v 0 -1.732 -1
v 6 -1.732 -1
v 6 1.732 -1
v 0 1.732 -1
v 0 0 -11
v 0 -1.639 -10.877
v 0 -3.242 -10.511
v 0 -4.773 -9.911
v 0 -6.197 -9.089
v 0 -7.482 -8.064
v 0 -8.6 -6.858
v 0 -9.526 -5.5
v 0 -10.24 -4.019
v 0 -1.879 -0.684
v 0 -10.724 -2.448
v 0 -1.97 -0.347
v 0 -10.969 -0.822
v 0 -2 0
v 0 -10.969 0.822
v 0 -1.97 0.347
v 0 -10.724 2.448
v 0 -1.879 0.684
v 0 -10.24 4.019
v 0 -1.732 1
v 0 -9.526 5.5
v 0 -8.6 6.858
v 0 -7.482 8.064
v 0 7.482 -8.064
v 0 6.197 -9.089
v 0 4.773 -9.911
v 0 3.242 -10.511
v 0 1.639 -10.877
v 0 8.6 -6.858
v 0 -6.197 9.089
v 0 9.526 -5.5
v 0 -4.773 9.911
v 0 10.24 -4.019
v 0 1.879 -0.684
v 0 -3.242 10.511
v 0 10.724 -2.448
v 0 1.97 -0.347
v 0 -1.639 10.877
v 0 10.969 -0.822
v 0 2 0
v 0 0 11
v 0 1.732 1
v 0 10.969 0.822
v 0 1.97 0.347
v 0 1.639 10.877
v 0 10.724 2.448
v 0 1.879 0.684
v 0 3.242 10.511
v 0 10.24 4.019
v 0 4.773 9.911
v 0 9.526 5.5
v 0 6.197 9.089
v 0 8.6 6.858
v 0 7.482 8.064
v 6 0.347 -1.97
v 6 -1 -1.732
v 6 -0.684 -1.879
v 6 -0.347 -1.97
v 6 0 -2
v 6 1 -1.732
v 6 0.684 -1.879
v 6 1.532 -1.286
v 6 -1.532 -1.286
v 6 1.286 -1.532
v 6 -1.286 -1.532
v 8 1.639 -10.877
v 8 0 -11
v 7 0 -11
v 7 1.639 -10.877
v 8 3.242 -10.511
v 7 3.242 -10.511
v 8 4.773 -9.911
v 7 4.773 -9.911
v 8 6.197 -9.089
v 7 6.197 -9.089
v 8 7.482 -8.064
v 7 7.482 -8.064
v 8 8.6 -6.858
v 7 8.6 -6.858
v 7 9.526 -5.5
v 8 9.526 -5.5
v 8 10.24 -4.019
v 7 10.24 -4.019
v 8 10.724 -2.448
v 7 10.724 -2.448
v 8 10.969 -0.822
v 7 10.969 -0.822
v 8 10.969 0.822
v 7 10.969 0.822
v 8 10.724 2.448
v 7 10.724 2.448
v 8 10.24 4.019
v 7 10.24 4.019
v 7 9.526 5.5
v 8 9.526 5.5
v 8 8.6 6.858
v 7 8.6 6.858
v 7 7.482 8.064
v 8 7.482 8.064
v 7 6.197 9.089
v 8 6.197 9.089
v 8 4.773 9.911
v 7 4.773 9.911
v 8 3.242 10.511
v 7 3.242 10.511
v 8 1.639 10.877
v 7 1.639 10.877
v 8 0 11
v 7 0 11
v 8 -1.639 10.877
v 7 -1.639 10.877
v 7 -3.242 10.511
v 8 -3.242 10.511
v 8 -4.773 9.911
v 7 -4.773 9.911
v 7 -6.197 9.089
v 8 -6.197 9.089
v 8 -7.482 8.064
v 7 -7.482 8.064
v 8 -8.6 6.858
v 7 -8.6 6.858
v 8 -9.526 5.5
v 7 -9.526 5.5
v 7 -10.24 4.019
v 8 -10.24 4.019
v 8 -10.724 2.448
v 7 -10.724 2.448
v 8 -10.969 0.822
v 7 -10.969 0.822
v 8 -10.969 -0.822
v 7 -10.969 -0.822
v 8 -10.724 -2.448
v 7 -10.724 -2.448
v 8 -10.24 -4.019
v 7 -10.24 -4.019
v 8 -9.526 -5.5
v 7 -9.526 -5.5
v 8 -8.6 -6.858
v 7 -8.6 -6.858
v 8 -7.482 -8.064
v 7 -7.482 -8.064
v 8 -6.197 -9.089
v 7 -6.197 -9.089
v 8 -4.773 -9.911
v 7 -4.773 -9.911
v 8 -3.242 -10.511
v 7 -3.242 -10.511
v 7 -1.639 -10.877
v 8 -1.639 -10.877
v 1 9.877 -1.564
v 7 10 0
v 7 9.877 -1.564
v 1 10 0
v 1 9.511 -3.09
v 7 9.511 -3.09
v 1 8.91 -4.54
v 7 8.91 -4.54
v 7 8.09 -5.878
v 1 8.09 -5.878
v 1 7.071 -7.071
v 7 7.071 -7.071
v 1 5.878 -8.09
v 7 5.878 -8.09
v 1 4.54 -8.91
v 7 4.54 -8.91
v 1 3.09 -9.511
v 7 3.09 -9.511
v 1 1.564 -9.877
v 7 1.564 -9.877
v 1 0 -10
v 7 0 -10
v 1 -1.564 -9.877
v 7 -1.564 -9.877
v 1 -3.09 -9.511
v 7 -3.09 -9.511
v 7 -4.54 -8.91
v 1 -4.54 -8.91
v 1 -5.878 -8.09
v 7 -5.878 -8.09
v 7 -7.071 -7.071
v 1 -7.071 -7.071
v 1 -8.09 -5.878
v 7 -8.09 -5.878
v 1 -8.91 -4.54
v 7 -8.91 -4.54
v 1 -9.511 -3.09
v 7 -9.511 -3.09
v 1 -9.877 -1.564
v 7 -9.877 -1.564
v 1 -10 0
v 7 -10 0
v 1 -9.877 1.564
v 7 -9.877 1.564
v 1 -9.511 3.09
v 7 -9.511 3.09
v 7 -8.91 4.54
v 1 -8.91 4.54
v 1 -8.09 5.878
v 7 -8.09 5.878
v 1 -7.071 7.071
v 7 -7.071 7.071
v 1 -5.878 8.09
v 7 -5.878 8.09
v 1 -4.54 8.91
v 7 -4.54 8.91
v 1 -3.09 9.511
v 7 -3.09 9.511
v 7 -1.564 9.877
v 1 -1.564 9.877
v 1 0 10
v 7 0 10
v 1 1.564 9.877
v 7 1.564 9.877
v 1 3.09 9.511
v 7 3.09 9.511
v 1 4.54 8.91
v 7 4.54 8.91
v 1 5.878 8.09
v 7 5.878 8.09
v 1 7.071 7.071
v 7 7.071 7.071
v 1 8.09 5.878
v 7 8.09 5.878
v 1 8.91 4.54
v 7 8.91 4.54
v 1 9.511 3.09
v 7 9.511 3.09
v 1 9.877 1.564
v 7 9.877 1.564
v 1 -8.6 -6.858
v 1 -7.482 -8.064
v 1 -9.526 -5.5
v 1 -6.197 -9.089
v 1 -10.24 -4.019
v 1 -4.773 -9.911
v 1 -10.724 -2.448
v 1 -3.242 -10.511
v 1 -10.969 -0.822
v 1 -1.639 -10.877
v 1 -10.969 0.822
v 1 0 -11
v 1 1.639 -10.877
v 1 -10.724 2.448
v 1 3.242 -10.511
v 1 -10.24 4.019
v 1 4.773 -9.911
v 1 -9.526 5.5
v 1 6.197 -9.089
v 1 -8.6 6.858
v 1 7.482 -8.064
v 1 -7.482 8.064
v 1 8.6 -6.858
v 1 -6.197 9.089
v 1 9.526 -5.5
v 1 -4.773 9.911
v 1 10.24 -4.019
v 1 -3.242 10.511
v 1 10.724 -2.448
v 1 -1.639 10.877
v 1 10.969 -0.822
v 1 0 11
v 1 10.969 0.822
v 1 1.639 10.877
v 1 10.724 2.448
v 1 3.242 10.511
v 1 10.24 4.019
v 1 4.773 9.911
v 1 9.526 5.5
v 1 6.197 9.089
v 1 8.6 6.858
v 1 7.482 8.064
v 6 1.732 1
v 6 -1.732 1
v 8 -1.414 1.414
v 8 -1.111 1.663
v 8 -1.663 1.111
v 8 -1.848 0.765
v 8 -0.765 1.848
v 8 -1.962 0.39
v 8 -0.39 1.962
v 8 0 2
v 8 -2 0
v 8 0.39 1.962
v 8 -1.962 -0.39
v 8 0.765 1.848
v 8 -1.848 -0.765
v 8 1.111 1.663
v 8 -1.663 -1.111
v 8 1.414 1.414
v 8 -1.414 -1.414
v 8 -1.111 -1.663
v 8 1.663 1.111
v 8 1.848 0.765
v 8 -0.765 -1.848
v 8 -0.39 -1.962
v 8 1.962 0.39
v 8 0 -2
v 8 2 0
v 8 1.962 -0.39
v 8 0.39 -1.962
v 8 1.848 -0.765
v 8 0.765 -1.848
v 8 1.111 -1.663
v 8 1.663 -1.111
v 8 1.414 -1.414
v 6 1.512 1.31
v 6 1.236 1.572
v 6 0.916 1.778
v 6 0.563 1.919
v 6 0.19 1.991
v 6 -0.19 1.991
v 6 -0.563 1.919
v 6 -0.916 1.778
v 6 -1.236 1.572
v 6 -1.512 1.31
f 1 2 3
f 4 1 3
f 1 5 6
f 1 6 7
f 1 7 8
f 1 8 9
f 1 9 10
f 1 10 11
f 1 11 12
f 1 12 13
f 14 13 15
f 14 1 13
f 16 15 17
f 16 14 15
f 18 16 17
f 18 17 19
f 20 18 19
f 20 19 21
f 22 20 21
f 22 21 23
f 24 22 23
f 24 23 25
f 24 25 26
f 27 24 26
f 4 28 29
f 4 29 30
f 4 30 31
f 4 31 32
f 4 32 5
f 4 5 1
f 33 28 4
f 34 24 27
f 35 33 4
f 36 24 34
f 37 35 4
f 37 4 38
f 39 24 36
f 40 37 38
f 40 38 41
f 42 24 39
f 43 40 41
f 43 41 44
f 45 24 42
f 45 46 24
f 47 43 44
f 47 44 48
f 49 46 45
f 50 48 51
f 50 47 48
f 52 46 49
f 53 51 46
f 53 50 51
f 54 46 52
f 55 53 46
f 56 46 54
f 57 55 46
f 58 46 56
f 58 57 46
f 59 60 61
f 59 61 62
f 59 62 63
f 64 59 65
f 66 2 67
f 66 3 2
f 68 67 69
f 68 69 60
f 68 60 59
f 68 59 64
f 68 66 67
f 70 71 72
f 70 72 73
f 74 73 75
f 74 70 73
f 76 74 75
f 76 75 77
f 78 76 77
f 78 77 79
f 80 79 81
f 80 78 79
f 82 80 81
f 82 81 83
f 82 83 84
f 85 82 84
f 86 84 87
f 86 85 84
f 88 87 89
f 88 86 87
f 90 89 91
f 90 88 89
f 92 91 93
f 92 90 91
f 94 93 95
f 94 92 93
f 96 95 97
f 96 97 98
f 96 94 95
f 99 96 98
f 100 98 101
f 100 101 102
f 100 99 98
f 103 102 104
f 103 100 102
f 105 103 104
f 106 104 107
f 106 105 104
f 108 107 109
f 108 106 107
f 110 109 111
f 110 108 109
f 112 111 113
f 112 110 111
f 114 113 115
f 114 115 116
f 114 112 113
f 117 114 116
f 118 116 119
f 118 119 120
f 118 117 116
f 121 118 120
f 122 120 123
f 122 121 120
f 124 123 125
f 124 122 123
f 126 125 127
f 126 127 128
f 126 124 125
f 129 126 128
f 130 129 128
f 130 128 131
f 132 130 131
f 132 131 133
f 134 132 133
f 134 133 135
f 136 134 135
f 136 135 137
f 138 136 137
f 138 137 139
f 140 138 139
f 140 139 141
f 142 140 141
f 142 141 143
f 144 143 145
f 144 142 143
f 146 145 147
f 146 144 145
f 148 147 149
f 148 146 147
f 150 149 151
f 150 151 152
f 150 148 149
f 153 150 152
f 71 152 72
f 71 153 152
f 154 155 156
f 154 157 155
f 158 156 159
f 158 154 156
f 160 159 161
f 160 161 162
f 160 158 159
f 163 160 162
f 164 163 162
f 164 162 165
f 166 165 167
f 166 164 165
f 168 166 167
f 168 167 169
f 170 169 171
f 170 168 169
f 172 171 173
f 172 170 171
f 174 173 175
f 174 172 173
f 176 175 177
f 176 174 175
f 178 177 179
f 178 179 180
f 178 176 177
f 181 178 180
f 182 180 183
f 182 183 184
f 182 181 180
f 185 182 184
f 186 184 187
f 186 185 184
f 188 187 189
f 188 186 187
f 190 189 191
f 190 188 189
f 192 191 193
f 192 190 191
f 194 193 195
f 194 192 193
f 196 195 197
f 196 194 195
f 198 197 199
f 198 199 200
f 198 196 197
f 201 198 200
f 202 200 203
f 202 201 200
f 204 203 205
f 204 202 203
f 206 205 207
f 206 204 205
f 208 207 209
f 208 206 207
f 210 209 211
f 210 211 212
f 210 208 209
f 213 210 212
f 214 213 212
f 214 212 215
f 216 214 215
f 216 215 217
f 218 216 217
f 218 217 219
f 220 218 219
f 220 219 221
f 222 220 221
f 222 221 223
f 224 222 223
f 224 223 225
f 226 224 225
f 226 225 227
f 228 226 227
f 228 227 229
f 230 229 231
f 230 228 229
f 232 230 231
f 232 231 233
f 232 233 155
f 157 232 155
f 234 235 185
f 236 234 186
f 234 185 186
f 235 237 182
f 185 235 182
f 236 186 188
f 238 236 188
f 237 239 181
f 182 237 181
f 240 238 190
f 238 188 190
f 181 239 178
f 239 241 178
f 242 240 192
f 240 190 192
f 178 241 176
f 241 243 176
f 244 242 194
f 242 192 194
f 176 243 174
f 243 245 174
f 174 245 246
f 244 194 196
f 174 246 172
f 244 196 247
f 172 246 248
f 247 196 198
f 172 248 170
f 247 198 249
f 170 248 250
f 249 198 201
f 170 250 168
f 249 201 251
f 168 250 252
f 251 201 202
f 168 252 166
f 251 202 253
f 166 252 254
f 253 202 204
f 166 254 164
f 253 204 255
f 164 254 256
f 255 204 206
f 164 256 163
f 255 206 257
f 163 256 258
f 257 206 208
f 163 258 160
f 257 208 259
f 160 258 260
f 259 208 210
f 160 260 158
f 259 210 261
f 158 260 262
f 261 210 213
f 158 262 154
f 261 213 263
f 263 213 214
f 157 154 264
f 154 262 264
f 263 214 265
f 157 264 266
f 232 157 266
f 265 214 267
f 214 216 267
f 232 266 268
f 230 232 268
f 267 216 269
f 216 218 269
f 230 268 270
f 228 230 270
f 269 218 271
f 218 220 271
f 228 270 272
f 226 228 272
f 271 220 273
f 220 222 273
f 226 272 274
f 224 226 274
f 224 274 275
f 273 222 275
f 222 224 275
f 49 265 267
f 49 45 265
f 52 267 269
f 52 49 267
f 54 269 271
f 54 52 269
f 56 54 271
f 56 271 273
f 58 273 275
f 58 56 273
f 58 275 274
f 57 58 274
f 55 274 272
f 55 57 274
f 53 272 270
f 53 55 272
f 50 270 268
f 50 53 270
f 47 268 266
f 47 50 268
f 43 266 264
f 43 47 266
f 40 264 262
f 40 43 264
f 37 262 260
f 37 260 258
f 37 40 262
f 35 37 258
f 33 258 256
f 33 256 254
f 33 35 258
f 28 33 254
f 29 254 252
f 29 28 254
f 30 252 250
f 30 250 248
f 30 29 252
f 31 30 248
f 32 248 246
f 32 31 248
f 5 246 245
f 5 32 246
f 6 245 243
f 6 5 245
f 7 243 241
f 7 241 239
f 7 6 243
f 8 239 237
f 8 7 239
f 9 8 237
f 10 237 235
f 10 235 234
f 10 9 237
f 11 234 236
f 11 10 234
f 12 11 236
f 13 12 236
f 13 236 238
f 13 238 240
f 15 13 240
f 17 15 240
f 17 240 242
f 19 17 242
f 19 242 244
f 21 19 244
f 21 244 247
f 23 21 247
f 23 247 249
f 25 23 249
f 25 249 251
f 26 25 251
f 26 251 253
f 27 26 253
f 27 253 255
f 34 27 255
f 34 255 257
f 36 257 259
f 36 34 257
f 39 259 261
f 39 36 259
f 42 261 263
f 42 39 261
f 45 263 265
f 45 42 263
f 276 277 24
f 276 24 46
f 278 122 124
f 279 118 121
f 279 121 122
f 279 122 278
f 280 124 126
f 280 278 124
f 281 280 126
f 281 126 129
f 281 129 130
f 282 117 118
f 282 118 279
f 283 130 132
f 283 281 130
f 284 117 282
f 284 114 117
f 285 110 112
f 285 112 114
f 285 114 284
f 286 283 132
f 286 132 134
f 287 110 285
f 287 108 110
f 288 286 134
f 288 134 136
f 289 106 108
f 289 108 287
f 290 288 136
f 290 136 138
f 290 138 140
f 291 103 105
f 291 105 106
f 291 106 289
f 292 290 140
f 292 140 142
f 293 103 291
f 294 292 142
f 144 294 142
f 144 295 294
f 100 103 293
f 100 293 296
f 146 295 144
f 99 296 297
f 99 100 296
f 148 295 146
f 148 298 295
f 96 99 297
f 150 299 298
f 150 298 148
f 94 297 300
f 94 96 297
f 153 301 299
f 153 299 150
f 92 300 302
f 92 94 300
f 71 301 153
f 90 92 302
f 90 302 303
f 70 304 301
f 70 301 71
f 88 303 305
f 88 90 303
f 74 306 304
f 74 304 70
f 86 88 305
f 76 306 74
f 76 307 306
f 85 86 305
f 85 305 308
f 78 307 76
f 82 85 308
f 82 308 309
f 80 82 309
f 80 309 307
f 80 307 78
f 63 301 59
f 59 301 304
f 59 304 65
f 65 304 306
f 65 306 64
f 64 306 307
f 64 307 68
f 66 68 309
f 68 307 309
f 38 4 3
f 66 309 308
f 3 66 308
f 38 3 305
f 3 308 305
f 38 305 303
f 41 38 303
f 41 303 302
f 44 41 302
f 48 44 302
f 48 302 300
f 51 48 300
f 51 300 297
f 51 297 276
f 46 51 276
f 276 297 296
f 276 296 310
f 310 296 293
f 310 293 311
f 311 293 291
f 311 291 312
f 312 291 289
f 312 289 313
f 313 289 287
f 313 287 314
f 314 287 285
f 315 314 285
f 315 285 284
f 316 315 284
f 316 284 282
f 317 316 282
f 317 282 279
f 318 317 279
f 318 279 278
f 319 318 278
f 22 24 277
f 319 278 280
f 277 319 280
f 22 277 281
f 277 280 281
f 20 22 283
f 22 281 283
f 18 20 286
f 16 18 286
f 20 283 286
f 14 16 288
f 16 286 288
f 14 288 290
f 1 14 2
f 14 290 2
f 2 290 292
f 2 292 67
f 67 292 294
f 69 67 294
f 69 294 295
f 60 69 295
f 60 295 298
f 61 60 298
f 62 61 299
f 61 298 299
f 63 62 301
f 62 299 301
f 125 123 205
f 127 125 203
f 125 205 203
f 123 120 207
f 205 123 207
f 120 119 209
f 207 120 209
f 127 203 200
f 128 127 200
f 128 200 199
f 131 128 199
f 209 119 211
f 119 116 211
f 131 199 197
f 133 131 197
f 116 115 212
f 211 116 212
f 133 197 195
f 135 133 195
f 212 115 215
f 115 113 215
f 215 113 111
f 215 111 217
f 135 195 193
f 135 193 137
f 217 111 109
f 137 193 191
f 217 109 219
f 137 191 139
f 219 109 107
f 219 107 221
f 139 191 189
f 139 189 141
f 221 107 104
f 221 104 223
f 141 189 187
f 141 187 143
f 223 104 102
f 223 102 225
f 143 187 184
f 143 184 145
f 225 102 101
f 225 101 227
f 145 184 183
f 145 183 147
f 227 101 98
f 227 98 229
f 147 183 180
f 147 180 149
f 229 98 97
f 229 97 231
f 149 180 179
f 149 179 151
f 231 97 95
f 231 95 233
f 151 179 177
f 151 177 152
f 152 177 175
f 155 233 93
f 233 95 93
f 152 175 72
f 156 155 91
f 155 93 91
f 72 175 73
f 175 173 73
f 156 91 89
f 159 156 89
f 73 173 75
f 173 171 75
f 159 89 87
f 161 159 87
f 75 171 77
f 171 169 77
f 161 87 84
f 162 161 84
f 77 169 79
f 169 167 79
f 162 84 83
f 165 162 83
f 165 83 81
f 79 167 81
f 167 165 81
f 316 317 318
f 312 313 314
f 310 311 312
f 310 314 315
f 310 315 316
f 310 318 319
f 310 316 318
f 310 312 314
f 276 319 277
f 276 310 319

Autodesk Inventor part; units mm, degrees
ref_plane "YZ Plane" through (0, 0, 0) normal (1, 0, 0) x (0, 1, 0)
ref_plane "XZ Plane" through (0, 0, 0) normal (0, 1, 0) x (-1, 0, 0)
ref_plane "XY Plane" through (0, 0, 0) normal (0, 0, 1) x (1, 0, 0)
sketch "Esboço1" plane through (0, 0, 0) normal (1, 0, 0) x (0, 1, 0)
  circle A0 centre (0, 0) radius 10
  dimension "d0" = 20
extrude "Extrusão1" add sketch "Esboço1" along normal blind 8
sketch "Esboço2" plane through (8, 0, 0) normal (1, 0, 0) x (0, 0, -1)
  circle A0 centre (0, 0) radius 2
  dimension "d3" = 4
extrude "Extrusão2" cut sketch "Esboço2" against normal blind 2
sketch "Esboço3" plane through (6, 0, 0) normal (1, 0, 0) x (0, 0, -1)
  line L0 (1, 0) -> (1, 1.7321)
  circle A0 centre (0, 0) radius 2 projected
  line L1 (1, 0) -> (1, -1.7321)
  line L2 (-1, 0) -> (-1, 1.7321)
  line L3 (-1, 0) -> (-1, -1.7321)
  arc A1 (-1, 1.7321) -> (0, 2) centre (0, 0) ccw
  arc A2 (-1, -1.7321) -> (1, -1.7321) centre (0, 0) ccw
  dimension "d6" = 1
  dimension "d7" = 1
extrude "Extrusão3" cut sketch "Esboço3" against normal through all contours L1 A0 L3 L2 L0
sketch "Esboço4" plane through (8, 0, 0) normal (1, 0, 0) x (0, 0, -1)
  circle A0 centre (0, 0) radius 2
  circle A1 centre (0, 0) radius 11
  dimension "d10" = 22
extrude "Extrusão4" add sketch "Esboço4" against normal blind 1
sketch "Esboço5" plane through (0, 0, 0) normal (-1, 0, 0) x (0, 0, 1)
  circle A0 centre (0, 0) radius 2
  circle A1 centre (0, 0) radius 11
extrude "Extrusão5" add sketch "Esboço5" against normal blind 1
properties part number "RODA MOTOR-PASSO"
